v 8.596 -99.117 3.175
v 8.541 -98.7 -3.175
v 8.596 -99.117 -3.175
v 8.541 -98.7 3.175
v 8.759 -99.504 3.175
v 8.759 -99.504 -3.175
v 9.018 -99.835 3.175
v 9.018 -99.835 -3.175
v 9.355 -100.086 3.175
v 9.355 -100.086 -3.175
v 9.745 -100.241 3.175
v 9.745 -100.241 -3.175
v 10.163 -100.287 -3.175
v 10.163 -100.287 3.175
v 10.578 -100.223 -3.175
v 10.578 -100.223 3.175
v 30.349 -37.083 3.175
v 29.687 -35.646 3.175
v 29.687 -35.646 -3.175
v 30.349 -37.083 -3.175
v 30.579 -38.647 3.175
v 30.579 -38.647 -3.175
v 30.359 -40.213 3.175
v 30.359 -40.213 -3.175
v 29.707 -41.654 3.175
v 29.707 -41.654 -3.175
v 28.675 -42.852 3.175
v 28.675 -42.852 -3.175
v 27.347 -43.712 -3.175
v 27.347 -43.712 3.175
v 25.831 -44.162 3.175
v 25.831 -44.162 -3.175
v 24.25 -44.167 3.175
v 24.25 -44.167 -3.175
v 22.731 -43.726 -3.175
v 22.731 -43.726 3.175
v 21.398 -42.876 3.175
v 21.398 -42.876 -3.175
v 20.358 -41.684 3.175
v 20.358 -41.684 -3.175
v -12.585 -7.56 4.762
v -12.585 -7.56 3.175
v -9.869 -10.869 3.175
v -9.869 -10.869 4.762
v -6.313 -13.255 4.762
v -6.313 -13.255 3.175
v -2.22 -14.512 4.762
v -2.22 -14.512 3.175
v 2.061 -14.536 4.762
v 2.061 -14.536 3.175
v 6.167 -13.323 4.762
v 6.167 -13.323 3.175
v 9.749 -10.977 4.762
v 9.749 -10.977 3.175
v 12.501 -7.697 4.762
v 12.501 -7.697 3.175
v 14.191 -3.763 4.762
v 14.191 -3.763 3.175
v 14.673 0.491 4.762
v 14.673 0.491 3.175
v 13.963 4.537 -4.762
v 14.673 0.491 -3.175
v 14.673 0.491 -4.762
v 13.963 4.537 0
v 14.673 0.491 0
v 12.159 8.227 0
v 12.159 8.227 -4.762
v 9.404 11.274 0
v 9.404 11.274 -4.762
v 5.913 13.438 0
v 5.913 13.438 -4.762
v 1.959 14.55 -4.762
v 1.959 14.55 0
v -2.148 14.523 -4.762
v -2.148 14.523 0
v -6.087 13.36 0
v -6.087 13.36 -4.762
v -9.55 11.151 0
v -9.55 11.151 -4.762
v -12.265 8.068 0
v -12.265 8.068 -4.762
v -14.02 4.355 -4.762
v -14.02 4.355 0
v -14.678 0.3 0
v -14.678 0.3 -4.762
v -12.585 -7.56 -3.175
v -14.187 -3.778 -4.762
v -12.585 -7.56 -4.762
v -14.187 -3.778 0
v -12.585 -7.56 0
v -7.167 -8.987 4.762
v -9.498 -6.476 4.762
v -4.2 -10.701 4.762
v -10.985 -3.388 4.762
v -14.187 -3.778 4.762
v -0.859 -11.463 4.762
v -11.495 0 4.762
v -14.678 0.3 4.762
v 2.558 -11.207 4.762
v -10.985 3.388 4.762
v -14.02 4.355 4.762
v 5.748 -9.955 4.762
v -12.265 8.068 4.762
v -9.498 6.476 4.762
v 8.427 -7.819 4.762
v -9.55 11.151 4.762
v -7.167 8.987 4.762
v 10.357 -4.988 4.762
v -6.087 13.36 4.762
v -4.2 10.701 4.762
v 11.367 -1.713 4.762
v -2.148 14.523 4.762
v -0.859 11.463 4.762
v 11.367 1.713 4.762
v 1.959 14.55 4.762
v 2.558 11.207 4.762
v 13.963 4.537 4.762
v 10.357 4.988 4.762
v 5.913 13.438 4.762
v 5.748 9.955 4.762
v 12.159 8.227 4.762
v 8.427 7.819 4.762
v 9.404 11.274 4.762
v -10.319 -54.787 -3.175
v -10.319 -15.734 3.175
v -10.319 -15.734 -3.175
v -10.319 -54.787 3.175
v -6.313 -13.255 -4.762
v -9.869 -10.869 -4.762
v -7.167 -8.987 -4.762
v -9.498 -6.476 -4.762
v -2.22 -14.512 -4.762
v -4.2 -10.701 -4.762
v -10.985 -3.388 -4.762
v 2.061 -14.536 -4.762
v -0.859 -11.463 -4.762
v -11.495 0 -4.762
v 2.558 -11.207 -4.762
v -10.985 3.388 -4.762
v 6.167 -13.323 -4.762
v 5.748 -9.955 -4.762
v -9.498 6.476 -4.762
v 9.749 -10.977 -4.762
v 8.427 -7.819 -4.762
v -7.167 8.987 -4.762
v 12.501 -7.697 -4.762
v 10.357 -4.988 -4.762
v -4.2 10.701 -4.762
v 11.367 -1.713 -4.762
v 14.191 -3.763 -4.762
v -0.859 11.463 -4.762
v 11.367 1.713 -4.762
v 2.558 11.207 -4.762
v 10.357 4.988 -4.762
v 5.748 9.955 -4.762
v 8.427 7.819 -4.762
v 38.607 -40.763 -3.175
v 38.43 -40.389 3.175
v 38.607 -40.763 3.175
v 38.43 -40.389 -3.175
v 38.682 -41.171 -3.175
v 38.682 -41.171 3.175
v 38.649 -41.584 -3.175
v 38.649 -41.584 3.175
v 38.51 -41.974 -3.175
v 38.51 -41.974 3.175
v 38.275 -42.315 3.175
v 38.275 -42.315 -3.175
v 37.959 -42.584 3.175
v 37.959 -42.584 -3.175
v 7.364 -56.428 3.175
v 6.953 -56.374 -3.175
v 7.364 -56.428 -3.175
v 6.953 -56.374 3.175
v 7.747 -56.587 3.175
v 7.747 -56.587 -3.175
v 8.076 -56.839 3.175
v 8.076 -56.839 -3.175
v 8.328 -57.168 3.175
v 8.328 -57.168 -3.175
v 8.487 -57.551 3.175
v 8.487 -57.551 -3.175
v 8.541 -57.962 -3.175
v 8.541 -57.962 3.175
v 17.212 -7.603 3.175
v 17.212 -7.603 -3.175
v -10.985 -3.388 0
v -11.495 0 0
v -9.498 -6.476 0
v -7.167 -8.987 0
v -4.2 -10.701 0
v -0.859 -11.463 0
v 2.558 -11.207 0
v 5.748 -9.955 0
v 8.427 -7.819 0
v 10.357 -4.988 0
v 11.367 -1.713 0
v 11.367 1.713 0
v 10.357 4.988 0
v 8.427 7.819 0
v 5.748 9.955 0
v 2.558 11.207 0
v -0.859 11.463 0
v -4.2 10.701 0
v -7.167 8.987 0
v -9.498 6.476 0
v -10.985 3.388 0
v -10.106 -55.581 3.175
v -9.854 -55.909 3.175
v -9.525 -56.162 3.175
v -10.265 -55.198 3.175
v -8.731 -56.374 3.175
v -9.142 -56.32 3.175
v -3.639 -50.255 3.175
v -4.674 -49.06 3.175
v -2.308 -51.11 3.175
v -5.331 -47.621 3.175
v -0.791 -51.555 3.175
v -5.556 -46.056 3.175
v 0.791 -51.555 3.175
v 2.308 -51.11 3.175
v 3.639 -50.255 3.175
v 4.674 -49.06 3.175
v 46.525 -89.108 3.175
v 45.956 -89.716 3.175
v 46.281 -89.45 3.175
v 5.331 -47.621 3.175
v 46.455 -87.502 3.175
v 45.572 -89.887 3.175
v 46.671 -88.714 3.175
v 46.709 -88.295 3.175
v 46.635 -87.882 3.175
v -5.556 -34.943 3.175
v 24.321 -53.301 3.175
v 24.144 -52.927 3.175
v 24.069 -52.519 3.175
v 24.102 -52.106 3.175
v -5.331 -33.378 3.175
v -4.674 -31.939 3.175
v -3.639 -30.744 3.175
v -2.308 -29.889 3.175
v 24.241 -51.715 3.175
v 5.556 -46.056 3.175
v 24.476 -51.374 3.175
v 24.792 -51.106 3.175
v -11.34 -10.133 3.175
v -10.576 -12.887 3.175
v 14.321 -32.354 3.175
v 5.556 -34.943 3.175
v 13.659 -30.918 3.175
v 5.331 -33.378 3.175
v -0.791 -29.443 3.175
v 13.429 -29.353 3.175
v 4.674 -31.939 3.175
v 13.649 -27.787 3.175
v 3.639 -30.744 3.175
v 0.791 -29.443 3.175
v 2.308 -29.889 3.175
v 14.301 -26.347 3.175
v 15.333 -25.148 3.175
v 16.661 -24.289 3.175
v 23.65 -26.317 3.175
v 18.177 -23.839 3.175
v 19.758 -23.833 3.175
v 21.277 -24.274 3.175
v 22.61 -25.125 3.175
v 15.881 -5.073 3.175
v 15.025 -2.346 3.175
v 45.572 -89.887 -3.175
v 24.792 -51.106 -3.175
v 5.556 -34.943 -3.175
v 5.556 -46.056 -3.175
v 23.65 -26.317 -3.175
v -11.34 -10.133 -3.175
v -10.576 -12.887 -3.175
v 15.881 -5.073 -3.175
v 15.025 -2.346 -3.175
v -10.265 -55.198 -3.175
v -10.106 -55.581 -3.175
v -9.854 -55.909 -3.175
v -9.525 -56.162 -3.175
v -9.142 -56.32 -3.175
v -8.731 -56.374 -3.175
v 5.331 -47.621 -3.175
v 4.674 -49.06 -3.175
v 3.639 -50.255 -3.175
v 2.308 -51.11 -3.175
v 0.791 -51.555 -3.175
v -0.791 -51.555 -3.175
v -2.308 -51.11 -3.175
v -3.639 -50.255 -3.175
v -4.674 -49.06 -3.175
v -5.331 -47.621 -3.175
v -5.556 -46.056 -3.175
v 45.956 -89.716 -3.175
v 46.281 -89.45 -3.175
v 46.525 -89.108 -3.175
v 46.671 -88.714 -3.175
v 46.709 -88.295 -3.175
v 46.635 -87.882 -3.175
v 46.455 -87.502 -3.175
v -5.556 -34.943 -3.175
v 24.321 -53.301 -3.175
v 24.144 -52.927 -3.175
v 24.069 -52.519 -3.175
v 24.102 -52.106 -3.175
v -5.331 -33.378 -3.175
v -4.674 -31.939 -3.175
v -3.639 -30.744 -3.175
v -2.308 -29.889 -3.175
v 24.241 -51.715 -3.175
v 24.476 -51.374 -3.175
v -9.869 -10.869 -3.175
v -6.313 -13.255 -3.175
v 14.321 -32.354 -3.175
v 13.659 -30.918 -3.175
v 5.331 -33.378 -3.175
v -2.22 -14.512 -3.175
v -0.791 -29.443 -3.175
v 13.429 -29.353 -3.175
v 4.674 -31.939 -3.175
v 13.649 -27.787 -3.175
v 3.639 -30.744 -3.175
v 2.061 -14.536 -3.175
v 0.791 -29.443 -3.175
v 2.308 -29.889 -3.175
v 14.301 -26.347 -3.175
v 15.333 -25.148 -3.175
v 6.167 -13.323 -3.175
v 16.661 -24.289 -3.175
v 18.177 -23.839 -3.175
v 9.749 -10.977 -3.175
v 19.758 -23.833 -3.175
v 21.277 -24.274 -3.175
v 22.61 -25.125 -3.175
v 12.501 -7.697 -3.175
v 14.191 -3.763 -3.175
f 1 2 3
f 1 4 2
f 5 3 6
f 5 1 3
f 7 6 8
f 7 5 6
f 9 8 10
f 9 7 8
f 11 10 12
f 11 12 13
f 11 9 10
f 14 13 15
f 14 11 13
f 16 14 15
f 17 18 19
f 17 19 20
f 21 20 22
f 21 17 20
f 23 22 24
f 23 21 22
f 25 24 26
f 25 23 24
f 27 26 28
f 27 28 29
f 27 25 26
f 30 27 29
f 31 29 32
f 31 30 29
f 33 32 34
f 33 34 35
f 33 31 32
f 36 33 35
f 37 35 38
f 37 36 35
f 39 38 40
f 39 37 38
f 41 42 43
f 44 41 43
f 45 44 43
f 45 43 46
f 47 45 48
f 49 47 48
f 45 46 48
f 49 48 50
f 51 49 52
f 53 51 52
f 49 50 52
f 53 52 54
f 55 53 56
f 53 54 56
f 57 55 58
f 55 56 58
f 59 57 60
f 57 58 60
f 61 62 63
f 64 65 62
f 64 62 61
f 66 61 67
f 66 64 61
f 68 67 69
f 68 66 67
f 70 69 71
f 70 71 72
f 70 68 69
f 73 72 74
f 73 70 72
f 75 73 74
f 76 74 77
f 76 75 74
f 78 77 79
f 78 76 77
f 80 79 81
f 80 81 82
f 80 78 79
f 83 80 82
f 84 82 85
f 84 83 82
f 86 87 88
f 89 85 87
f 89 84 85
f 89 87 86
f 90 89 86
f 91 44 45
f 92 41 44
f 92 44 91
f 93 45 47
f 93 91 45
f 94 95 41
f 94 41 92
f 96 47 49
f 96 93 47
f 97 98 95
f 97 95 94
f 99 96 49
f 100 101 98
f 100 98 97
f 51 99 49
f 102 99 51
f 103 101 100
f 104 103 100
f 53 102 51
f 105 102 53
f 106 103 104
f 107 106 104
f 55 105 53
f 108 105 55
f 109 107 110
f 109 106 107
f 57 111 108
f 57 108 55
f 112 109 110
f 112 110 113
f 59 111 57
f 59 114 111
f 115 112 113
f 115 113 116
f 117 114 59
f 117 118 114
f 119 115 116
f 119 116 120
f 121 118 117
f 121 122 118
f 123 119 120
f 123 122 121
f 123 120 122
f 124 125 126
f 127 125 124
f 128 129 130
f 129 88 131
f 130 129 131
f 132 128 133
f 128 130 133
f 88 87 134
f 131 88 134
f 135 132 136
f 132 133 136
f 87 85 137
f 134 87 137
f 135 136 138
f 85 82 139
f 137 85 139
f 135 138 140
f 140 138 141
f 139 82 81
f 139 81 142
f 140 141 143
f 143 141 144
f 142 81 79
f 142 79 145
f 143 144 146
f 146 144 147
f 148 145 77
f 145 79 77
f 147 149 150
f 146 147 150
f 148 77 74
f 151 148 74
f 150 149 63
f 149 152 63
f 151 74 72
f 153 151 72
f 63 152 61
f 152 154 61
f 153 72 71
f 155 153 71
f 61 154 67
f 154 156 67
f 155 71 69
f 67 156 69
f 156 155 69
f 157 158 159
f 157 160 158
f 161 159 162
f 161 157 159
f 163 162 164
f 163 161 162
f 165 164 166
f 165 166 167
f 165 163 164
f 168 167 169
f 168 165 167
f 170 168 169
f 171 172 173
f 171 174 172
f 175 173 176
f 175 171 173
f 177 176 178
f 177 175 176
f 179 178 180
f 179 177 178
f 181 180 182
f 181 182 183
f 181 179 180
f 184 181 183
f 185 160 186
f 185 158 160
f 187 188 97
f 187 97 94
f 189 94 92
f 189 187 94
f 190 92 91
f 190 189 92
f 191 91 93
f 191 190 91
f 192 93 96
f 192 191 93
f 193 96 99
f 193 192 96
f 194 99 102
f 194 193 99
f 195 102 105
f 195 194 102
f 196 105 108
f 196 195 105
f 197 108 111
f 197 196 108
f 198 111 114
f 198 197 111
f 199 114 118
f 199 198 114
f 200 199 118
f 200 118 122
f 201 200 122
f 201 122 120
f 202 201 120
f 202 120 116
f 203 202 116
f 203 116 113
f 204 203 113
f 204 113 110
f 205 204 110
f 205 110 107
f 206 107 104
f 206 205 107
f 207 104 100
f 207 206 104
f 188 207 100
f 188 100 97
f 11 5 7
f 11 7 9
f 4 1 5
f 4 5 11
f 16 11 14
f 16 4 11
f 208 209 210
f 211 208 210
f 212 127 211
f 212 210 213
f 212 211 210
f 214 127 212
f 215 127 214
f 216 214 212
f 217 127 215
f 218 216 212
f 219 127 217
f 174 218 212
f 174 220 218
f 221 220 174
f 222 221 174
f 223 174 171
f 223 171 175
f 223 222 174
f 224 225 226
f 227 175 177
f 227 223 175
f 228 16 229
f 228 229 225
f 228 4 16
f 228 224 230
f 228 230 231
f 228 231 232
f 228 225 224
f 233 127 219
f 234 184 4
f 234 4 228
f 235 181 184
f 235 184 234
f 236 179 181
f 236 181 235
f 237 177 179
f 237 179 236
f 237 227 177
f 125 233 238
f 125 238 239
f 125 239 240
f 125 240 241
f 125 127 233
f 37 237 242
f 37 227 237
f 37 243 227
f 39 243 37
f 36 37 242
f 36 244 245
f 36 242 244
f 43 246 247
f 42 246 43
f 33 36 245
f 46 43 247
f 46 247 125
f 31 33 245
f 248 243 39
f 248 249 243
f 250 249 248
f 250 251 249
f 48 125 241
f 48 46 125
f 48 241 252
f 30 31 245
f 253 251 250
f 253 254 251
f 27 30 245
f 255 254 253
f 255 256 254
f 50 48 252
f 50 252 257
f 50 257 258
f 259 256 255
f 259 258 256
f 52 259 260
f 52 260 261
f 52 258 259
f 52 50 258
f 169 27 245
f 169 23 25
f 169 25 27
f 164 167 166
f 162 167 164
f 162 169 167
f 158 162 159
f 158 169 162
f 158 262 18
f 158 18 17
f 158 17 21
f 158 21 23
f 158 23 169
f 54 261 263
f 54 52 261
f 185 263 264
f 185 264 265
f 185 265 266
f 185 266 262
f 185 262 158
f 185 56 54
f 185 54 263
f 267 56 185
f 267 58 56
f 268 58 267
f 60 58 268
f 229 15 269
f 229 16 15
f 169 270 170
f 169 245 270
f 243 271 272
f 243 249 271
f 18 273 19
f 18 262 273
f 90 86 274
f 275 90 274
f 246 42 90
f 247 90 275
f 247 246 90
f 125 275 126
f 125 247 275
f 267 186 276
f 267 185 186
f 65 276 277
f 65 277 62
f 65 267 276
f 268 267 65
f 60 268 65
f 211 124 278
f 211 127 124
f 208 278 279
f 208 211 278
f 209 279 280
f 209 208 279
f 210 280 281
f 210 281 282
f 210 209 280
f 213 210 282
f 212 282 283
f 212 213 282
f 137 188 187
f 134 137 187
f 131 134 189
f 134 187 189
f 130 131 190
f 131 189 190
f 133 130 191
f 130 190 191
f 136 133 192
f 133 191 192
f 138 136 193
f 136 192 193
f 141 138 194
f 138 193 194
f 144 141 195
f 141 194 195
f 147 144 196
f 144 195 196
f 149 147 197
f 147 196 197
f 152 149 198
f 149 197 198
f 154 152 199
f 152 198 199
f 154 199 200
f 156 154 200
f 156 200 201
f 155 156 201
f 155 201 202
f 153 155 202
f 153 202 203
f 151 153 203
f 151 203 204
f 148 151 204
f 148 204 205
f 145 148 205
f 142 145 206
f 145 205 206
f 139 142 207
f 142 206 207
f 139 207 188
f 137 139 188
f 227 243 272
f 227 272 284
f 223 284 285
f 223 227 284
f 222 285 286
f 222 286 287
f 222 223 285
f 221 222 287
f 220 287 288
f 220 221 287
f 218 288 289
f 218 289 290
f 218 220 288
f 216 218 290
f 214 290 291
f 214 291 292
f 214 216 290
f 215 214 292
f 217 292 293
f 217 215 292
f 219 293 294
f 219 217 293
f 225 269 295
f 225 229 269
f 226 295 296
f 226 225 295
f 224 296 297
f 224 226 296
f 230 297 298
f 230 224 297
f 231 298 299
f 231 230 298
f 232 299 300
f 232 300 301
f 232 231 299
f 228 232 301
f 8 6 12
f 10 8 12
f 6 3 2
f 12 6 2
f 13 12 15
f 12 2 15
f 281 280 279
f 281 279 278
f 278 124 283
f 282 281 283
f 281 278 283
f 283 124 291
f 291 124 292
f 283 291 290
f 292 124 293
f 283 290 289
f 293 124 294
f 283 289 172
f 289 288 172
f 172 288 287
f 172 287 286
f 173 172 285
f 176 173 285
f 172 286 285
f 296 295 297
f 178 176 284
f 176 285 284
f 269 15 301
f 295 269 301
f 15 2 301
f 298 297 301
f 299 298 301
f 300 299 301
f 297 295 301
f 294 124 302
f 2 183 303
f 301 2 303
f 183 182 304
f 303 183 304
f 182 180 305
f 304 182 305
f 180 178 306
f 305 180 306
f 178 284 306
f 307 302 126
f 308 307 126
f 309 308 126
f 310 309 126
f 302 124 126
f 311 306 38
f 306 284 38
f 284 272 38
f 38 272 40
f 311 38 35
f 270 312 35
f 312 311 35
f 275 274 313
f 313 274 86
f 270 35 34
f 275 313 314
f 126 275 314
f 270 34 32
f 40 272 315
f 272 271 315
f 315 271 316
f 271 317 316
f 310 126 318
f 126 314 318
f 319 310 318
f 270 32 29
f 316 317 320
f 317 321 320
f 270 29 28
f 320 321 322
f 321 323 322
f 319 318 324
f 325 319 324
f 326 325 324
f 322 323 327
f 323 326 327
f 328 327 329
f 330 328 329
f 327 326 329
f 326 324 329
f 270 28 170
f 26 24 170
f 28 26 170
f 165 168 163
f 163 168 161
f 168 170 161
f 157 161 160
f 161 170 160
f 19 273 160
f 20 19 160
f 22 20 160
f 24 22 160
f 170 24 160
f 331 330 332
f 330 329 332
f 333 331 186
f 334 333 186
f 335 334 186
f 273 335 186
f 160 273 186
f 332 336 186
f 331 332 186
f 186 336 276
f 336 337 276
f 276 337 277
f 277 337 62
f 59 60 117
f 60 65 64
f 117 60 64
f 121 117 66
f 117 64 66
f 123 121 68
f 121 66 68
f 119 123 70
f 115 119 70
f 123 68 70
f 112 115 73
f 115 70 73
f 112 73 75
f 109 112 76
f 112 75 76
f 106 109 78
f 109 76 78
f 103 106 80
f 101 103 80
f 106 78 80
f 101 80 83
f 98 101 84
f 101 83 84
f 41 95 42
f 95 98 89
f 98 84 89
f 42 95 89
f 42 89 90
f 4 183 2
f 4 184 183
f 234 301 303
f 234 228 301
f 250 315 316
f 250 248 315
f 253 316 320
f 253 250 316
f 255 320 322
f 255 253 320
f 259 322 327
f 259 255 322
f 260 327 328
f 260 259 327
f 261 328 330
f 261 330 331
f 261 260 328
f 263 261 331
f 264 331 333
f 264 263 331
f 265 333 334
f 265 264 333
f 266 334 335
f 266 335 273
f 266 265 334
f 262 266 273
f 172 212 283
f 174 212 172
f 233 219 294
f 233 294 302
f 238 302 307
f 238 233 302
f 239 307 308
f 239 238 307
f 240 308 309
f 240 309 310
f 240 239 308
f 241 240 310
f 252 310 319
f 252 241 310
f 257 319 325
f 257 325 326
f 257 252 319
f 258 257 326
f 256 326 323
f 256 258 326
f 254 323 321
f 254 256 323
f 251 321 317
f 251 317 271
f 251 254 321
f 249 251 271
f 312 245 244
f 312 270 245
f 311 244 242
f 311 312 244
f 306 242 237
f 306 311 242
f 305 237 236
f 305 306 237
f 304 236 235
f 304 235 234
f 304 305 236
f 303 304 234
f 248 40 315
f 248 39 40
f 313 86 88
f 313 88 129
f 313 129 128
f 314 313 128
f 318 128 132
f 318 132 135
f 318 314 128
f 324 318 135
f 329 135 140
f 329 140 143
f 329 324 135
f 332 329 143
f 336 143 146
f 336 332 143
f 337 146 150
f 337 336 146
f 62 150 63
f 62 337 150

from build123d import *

# Parameters (mm, degrees)
SKETCH1_R           = 11.495405
BOSS_EXTRUDE2_DEPTH = 4.7625
BOSS_EXTRUDE3_DEPTH = 3.175
FILLET1_R           = 1.5875


with BuildPart() as part:
    # Sketch1 → Boss-Extrude2 (new, symmetric)
    with BuildSketch(Plane.XY):
        with BuildLine():
            ThreePointArc((14.672983865, 0.491098707), (-4.158599684, 14.079903484), (-12.585193267, -7.559797873))
            ThreePointArc((-12.585193267, -7.559797873), (4.158599684, -14.079903484), (14.672983865, 0.491098707))
        make_face()
        Circle(SKETCH1_R, mode=Mode.SUBTRACT)
    extrude(amount=BOSS_EXTRUDE2_DEPTH, both=True)

    # Sketch1<4> → Boss-Extrude3 (add, symmetric)
    with BuildSketch(Plane.XY):
        with BuildLine():
            ThreePointArc((-12.585193267, -7.559797873), (-10.89585042, -11.492870345), (-10.31875, -15.734319794))
            Line((-10.31875, -15.734319794), (-10.31875, -56.374319794))
            Line((-10.31875, -56.374319794), (8.54075, -56.374319794))
            Line((8.54075, -56.374319794), (8.54075, -100.824319794))
            Line((8.54075, -100.824319794), (47.609422672, -89.285109315))
            Line((47.609422672, -89.285109315), (23.458960581, -51.968120144))
            Line((23.458960581, -51.968120144), (39.292025986, -41.721424085))
            Line((39.292025986, -41.721424085), (17.211603503, -7.603033986))
            ThreePointArc((17.211603503, -7.603033986), (15.391641433, -3.728672569), (14.672983865, 0.491098707))
            ThreePointArc((14.672983865, 0.491098707), (4.158599684, -14.079903484), (-12.585193267, -7.559797873))
        make_face()
        with BuildLine():
            ThreePointArc((5.55625, -46.055569794), (0, -51.611819794), (-5.55625, -46.055569794))
            Line((-5.55625, -46.055569794), (-5.55625, -34.943069794))
            ThreePointArc((-5.55625, -34.943069794), (0, -29.386819794), (5.55625, -34.943069794))
            Line((5.55625, -34.943069794), (5.55625, -46.055569794))
        make_face(mode=Mode.SUBTRACT)
        with BuildLine():
            ThreePointArc((29.687419875, -35.646101109), (28.04160399, -43.329532516), (20.358172583, -41.683716631))
            Line((20.358172583, -41.683716631), (14.32055706, -32.354469339))
            ThreePointArc((14.32055706, -32.354469339), (15.966372945, -24.671037931), (23.649804353, -26.316853816))
            Line((23.649804353, -26.316853816), (29.687419875, -35.646101109))
        make_face(mode=Mode.SUBTRACT)
    extrude(amount=BOSS_EXTRUDE3_DEPTH, both=True)

    # Fillet1
    fillet1_edges = [part.edges().sort_by_distance(p)[0] for p in [
        (-10.31875, -56.374319794, 0),
        (39.292025986, -41.721424085, 0),
        (8.54075, -100.824319794, 0),
        (47.609422672, -89.285109315, 0),
        (23.458960581, -51.968120144, 0),
        (8.54075, -56.374319794, 0),
    ]]
    fillet(fillet1_edges, radius=FILLET1_R)


solid = part.part
